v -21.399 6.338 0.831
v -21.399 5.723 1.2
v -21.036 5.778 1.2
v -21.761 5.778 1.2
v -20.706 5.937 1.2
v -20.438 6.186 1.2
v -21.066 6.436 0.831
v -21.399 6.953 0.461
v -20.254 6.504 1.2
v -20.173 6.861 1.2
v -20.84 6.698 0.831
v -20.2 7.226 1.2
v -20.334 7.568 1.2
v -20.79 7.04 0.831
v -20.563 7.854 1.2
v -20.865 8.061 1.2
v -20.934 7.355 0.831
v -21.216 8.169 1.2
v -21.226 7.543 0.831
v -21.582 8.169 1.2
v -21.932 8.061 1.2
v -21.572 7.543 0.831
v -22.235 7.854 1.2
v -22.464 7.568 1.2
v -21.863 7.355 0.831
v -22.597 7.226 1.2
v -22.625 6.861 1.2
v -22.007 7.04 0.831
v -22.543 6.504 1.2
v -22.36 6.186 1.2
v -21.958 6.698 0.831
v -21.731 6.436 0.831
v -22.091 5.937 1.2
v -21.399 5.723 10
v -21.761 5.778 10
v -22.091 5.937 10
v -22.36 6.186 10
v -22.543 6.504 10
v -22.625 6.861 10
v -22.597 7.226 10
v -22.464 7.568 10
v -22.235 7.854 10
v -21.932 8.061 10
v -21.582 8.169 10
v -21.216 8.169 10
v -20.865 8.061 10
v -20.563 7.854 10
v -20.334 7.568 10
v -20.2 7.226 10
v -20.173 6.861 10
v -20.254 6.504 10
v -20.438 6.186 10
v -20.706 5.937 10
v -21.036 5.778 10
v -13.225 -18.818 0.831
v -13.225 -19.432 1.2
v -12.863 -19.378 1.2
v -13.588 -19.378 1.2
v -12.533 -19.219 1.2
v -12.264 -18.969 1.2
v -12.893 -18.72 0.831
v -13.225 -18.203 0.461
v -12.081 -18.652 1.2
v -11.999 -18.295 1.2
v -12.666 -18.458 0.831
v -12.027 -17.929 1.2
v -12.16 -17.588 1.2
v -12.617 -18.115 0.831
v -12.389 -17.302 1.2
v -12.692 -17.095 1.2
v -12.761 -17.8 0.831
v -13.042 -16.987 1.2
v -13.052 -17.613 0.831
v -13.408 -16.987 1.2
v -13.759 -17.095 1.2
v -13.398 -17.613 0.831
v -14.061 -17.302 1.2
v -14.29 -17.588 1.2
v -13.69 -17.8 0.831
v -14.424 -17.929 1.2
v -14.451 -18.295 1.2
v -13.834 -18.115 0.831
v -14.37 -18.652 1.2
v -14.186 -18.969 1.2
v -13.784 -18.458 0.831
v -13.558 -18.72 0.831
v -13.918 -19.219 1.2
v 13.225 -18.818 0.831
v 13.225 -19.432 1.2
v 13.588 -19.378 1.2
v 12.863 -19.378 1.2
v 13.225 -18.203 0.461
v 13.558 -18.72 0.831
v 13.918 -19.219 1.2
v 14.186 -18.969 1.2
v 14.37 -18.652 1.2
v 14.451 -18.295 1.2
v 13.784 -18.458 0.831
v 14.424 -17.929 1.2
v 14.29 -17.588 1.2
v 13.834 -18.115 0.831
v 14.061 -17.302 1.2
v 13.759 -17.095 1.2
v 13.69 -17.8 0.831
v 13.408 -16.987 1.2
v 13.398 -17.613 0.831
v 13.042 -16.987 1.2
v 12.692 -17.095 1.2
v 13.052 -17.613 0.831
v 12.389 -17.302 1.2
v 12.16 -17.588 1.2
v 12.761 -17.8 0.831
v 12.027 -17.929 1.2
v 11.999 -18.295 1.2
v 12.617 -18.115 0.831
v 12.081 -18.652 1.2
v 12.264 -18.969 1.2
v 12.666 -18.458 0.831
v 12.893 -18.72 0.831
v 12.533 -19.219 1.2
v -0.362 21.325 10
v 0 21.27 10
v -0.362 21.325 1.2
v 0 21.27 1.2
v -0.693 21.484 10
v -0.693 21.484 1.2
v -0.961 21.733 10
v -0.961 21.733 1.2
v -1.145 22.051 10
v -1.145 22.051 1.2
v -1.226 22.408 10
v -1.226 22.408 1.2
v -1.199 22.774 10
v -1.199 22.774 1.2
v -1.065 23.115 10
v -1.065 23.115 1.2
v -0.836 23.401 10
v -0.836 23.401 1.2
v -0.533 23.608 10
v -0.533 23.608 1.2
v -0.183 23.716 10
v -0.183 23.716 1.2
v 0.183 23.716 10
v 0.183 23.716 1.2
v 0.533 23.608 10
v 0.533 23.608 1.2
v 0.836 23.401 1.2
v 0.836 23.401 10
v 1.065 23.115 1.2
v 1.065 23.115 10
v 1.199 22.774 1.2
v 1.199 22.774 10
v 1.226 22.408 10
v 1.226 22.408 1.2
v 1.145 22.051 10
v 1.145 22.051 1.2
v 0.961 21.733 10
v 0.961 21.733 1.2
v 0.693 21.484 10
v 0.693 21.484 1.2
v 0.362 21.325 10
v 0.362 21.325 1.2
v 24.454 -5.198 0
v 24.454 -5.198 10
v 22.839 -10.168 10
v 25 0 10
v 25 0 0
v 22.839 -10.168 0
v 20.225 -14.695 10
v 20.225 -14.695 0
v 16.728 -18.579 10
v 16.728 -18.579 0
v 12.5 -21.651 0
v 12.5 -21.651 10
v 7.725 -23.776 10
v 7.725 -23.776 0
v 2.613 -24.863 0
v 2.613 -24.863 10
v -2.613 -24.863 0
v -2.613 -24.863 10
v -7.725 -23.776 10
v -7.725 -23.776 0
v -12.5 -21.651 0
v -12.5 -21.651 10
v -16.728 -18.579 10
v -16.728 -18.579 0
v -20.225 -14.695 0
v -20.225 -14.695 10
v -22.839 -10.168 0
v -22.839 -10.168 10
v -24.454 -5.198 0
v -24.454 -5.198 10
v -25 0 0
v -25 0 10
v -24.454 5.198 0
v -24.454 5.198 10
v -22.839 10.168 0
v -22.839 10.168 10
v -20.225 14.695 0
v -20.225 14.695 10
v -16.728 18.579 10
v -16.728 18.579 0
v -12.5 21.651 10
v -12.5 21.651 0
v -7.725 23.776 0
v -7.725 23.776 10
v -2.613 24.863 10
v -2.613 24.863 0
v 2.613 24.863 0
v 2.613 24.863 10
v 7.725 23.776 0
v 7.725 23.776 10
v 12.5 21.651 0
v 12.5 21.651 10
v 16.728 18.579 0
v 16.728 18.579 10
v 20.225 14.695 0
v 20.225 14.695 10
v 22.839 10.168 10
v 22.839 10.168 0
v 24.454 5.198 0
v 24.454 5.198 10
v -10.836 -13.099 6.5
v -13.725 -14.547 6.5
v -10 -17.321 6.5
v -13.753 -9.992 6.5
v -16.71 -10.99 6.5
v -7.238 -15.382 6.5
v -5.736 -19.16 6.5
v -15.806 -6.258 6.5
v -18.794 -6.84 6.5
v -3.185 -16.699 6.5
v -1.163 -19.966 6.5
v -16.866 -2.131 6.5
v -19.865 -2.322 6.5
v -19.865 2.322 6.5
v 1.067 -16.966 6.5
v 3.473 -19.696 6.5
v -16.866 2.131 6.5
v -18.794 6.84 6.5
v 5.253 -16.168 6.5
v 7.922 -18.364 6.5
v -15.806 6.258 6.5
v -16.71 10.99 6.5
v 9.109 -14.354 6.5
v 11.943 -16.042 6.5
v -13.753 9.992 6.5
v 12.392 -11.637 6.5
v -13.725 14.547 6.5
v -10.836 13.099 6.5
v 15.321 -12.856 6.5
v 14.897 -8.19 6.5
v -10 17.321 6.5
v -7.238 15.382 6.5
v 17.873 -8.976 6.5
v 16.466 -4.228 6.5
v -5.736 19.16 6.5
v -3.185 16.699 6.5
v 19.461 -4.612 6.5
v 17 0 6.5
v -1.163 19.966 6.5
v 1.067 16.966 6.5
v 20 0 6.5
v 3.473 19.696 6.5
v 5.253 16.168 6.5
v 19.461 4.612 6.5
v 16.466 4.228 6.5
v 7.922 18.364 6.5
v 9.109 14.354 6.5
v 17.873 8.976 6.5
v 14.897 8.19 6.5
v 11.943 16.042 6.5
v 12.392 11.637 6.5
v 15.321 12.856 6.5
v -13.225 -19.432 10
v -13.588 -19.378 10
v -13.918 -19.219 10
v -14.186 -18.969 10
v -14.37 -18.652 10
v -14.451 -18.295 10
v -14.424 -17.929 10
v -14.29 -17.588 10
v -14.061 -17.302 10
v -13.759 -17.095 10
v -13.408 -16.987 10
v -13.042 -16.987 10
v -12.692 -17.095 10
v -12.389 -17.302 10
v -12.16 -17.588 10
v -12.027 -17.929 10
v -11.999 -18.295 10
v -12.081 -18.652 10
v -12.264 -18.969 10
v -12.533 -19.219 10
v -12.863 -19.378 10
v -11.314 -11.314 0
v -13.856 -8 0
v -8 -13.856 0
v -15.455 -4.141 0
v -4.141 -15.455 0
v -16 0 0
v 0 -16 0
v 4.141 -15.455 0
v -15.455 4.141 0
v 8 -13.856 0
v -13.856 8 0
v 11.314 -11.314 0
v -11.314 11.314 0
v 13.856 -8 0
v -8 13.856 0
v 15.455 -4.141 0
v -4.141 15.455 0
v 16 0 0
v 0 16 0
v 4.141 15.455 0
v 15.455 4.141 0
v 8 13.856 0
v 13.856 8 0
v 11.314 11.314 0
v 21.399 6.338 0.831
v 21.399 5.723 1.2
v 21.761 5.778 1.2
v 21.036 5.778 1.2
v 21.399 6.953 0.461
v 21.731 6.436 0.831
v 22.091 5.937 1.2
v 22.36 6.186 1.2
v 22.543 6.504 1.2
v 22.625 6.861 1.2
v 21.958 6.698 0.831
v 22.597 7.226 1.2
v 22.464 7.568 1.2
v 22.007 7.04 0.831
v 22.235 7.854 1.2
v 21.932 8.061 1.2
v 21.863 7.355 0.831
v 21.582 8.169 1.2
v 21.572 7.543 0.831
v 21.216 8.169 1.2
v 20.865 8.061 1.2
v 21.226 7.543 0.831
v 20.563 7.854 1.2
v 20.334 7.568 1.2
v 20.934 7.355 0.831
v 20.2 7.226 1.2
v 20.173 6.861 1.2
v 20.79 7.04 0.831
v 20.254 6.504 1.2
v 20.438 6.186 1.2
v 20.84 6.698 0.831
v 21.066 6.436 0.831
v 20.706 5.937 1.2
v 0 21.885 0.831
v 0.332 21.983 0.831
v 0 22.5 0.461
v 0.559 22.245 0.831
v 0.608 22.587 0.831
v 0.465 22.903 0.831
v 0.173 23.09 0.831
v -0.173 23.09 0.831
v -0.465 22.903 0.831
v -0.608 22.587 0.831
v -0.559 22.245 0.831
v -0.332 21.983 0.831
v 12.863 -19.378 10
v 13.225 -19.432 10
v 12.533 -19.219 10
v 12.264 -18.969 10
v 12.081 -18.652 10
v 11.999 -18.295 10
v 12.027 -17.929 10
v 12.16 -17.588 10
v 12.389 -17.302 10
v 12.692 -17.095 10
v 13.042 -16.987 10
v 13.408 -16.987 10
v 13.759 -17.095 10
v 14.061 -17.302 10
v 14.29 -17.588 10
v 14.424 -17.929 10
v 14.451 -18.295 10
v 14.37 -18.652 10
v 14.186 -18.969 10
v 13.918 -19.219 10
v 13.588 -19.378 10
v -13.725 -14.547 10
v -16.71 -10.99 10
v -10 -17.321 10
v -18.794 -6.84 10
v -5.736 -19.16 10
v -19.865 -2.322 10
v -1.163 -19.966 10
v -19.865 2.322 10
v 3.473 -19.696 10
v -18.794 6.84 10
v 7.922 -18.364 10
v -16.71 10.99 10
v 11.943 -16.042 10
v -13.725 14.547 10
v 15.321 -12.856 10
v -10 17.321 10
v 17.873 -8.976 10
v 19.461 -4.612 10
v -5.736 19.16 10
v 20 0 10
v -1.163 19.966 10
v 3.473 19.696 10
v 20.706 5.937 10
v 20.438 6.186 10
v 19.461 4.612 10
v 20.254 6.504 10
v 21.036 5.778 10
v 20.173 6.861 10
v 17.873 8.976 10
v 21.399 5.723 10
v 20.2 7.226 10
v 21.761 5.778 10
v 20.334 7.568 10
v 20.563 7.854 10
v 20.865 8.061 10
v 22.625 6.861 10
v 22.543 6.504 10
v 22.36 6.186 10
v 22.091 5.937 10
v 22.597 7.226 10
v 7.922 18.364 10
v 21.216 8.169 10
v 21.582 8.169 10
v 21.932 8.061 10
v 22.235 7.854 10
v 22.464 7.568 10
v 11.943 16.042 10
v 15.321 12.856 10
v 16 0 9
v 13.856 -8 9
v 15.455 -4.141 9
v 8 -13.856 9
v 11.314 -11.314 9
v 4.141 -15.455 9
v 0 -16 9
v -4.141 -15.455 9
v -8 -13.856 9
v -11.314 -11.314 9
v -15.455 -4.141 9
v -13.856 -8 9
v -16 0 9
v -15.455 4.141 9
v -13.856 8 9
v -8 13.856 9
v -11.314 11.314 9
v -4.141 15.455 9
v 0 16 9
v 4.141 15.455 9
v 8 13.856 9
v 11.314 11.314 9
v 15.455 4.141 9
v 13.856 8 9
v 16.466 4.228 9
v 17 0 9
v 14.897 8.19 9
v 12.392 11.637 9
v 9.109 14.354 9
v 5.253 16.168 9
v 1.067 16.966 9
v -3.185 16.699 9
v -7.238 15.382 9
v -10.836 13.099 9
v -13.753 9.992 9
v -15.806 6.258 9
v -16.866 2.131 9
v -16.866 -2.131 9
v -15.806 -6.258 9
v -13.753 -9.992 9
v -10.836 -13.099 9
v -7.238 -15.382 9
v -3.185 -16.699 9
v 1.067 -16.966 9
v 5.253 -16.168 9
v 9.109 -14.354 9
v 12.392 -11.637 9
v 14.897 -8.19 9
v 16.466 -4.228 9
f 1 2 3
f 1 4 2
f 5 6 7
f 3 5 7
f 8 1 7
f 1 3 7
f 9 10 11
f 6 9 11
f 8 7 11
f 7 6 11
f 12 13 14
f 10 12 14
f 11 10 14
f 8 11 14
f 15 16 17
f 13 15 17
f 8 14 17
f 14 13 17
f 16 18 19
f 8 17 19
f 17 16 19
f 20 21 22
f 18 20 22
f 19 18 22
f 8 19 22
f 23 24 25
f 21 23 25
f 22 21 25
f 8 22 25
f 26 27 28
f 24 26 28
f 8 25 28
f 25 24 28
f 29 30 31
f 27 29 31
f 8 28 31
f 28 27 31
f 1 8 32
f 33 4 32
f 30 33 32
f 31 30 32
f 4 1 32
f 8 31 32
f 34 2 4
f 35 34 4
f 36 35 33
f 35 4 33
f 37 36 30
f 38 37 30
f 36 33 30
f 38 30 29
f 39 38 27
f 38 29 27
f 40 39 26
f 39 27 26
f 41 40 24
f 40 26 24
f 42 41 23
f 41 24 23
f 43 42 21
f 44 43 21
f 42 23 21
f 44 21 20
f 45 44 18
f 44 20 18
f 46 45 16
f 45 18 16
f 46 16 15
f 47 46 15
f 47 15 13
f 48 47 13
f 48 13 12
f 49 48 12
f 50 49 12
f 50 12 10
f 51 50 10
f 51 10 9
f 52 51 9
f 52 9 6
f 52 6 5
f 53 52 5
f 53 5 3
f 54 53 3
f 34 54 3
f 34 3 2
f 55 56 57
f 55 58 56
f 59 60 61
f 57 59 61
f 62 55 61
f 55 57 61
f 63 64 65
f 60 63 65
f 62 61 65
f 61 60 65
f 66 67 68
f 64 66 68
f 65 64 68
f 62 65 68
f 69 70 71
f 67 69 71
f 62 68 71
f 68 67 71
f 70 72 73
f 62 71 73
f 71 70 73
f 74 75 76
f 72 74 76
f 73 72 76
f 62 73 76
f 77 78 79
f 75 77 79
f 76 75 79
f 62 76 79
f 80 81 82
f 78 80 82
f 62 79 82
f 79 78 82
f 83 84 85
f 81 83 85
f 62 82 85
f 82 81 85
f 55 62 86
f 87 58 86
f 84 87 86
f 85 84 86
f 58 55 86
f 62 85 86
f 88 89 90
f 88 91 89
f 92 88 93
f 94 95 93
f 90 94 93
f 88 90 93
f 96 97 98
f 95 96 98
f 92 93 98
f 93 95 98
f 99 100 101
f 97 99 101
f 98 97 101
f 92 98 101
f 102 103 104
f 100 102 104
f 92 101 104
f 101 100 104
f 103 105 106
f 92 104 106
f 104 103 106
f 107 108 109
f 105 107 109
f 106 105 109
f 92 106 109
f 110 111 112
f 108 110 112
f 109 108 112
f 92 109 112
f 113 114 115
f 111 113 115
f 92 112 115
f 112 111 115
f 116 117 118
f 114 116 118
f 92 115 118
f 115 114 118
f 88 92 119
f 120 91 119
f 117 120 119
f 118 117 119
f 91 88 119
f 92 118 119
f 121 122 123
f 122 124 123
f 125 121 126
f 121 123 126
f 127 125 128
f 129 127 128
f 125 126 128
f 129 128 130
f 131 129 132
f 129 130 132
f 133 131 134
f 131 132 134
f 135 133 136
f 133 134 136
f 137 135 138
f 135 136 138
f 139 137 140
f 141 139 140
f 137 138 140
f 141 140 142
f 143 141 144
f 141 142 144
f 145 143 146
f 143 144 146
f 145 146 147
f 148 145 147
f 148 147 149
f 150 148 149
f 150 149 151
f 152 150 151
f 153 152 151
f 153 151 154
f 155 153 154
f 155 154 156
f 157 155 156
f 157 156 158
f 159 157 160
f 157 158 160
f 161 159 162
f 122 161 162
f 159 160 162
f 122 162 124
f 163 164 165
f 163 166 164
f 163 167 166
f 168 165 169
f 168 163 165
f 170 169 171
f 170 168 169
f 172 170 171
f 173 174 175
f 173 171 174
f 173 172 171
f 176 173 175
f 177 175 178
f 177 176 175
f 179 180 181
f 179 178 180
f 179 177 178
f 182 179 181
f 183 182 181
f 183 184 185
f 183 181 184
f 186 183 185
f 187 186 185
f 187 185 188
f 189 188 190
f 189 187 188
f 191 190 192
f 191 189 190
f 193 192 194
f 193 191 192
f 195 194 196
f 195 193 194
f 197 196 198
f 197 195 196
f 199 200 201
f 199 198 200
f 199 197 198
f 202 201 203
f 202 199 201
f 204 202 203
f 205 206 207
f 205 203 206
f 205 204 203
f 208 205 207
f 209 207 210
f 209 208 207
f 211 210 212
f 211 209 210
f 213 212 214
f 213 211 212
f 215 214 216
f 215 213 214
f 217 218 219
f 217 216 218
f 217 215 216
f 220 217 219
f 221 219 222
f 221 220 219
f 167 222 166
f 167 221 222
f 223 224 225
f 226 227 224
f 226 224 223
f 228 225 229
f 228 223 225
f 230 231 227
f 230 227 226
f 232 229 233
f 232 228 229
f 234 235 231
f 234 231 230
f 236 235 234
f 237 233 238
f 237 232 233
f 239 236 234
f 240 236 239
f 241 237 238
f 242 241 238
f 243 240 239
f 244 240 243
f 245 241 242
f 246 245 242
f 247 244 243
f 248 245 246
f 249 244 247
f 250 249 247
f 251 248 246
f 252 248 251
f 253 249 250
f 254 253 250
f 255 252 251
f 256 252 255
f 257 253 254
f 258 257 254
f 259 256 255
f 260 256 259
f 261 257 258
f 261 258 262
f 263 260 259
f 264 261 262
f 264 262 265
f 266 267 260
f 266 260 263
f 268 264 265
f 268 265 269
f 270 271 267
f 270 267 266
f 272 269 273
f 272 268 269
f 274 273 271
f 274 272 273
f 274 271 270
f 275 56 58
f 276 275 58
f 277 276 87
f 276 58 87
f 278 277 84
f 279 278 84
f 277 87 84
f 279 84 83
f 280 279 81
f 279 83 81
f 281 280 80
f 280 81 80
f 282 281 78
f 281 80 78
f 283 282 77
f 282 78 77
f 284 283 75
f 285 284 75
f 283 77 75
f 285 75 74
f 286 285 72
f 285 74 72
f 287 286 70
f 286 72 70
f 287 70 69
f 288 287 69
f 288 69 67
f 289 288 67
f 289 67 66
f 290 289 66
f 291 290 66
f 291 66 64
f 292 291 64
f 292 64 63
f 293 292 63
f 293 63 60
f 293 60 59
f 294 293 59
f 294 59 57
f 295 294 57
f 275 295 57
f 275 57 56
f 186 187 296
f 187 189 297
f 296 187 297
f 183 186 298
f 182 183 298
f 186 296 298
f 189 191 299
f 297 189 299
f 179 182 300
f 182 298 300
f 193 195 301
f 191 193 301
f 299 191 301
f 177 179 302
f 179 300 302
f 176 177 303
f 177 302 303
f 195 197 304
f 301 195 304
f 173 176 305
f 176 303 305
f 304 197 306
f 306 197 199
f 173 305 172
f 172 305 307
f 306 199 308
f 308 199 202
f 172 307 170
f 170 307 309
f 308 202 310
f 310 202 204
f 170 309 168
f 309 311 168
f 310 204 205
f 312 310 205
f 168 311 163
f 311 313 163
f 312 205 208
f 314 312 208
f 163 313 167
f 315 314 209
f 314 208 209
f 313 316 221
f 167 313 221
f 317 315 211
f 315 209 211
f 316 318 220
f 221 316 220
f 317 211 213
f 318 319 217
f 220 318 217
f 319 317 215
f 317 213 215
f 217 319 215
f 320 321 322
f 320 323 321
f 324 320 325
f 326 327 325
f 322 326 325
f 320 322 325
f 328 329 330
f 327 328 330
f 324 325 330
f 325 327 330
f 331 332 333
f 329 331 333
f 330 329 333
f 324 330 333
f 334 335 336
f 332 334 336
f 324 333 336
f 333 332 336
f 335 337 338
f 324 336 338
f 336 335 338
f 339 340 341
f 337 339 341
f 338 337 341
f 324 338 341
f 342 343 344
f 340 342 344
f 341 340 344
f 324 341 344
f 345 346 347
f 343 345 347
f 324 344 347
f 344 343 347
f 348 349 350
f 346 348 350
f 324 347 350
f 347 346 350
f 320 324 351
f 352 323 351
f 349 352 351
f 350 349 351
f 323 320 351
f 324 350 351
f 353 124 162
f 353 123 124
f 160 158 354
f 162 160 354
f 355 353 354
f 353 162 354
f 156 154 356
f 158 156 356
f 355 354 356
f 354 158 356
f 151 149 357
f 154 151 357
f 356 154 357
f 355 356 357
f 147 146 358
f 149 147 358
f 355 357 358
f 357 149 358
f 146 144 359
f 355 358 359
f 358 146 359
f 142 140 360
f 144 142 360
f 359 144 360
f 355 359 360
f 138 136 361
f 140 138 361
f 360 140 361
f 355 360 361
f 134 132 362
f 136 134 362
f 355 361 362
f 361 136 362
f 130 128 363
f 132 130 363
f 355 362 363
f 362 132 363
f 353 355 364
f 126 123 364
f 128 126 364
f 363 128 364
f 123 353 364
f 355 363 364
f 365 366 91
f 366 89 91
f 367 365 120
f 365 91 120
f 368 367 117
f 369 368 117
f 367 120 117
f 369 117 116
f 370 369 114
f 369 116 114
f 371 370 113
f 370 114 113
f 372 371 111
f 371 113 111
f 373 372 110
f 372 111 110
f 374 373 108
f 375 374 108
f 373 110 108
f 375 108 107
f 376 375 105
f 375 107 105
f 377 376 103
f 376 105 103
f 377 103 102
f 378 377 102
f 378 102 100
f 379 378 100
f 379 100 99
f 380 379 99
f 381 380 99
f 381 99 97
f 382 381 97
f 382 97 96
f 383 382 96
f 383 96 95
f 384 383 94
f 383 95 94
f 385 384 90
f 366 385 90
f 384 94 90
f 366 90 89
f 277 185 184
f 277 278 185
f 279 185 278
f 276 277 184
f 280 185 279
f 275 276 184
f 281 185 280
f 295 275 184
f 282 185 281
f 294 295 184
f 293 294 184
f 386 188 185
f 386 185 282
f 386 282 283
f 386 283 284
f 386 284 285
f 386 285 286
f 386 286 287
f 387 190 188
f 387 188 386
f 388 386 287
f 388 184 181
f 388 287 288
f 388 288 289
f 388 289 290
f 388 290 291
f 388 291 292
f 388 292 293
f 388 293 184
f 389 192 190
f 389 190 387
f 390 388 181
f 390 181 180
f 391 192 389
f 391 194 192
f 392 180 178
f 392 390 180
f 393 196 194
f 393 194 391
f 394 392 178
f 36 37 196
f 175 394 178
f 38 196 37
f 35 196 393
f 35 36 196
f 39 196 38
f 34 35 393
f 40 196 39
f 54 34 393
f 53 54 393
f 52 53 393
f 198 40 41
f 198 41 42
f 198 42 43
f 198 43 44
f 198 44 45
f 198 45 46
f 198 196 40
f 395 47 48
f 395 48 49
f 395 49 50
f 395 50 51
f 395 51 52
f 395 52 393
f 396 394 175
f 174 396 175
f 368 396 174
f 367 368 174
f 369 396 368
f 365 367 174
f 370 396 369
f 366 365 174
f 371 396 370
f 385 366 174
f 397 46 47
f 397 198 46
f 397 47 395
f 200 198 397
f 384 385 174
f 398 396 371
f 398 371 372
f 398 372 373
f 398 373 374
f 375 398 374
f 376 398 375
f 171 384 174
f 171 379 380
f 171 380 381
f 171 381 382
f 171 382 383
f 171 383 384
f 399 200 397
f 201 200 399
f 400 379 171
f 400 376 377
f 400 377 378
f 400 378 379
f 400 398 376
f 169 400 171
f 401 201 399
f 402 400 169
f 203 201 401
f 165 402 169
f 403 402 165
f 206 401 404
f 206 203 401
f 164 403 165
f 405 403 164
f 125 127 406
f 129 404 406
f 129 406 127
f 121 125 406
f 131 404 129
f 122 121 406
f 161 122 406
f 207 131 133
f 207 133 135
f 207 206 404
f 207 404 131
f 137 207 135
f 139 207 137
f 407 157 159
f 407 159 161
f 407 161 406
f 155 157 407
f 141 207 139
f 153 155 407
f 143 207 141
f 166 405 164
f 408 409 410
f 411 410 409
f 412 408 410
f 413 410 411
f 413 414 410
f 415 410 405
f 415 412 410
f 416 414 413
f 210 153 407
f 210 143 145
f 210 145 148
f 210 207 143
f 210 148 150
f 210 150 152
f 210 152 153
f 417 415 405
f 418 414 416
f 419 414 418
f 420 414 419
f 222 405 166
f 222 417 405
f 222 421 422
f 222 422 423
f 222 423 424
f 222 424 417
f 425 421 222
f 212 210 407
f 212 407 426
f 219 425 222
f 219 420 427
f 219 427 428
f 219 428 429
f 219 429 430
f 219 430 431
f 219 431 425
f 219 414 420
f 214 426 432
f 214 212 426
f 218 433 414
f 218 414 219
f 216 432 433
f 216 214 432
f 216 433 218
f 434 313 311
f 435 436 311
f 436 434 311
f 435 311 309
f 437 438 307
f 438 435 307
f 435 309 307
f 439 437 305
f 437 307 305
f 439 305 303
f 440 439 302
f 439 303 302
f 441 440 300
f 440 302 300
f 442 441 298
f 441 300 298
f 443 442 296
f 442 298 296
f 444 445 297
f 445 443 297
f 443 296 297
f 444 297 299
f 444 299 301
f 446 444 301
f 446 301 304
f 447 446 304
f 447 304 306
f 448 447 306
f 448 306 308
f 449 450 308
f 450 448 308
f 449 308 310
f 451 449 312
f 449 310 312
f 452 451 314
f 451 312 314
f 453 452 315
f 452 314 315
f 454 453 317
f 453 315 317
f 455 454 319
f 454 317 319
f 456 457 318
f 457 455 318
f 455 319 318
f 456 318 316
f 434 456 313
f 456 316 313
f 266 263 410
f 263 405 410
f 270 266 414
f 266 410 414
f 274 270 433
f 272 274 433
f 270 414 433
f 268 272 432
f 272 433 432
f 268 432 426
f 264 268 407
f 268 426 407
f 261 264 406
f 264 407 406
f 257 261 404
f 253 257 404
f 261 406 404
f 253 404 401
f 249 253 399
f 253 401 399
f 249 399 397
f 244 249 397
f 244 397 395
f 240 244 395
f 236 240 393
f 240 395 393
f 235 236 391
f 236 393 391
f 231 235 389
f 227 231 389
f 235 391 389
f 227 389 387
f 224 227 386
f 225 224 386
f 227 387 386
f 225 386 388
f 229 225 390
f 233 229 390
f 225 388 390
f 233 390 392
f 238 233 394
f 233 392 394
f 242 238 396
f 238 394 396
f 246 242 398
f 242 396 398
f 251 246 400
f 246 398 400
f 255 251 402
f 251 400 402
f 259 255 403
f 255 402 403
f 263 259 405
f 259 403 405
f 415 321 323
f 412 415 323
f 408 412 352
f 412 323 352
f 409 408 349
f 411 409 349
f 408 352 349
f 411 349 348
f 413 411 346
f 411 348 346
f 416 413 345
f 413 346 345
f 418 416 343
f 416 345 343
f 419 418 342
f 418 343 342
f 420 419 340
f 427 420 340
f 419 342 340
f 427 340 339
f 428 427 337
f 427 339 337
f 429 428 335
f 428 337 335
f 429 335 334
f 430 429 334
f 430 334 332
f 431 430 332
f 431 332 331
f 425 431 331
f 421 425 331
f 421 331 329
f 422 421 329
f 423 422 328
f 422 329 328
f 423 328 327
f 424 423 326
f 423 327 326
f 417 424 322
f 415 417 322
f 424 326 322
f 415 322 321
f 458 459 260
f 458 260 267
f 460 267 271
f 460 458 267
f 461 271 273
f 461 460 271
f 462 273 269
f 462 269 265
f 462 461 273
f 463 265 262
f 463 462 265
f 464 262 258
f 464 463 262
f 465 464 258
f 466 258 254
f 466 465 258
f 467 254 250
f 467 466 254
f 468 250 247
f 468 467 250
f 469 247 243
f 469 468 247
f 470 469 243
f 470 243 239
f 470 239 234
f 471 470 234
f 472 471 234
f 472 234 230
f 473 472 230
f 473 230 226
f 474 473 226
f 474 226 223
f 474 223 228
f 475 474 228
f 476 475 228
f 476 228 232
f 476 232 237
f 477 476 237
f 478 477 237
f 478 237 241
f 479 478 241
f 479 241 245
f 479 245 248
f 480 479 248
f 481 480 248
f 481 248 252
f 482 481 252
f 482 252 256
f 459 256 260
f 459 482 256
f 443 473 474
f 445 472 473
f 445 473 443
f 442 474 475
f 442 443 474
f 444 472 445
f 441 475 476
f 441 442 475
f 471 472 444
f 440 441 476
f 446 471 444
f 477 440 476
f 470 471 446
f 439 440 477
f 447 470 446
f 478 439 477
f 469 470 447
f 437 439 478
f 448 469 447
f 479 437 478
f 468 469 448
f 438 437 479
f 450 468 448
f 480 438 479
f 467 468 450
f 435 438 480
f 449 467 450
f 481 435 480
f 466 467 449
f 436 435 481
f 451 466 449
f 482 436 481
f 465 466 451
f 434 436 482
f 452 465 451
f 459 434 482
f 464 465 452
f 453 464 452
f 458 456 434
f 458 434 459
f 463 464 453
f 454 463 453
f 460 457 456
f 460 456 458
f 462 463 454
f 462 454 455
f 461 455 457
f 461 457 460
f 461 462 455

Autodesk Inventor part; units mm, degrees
ref_plane "YZ Plane" through (0, 0, 0) normal (1, 0, 0) x (0, 1, 0)
ref_plane "XZ Plane" through (0, 0, 0) normal (0, 1, 0) x (-1, 0, 0)
ref_plane "XY Plane" through (0, 0, 0) normal (0, 0, 1) x (1, 0, 0)
sketch "Sketch2" plane through (0, 0, 0) normal (0, 0, 1) x (1, 0, 0)
  circle A0 centre (0, 0) radius 25
  circle A1 centre (0, 0) radius 16
  dimension "d0" = 50
  dimension "d1" = 32
extrude "Extrusion1" add sketch "Sketch2" along normal blind 10
sketch "Sketch3" plane through (0, 0, 10) normal (0, 0, 1) x (1, 0, 0)
  circle A0 centre (0, 0) radius 25 construction
  circle A1 centre (0, 0) radius 16 construction
  circle A2 centre (0, 0) radius 16
  circle A3 centre (0, 0) radius 20
  dimension "d4" = 4
extrude "Extrusion2" cut sketch "Sketch3" against normal blind 1
sketch "Sketch4" plane through (0, 0, 9) normal (0, 0, 1) x (1, 0, 0)
  circle A0 centre (0, 0) radius 20 construction
  circle A1 centre (0, 0) radius 16 construction
  circle A2 centre (0, 0) radius 20
  circle A3 centre (0, 0) radius 17
  dimension "d7" = 1
  dimension "d8" = 40
  dimension "d9" = 34
extrude "Extrusion3" cut sketch "Sketch4" against normal blind 2.5
sketch "Sketch5" plane through (0, 0, 10) normal (0, 0, 1) x (1, 0, 0)
  line L0 (0, 35) -> (0, -35) construction
  circle A0 centre (0, 0) radius 20 construction
  point P0 (0, 22.5)
  point P1 (-21.3988, 6.9529)
  point P2 (-13.2252, -18.2029)
  point P3 (13.2252, -18.2029)
  point P4 (21.3988, 6.9529)
  dimension "d12" = 22.5
  dimension "d15" = 360
hole "Hole1" at (-21.3988, 6.9529, 10) at (0, 22.5, 10) at (21.3988, 6.9529, 10) at (13.2252, -18.2029, 10) at (-13.2252, -18.2029, 10) direction (0, 0, -1) diameter 2.459 depth 8.8 tip angle 118 thread size "M3x0.5" class "6H" standard "ISO Metric profile"
properties part number "P029_BasEcranProtecCam"
